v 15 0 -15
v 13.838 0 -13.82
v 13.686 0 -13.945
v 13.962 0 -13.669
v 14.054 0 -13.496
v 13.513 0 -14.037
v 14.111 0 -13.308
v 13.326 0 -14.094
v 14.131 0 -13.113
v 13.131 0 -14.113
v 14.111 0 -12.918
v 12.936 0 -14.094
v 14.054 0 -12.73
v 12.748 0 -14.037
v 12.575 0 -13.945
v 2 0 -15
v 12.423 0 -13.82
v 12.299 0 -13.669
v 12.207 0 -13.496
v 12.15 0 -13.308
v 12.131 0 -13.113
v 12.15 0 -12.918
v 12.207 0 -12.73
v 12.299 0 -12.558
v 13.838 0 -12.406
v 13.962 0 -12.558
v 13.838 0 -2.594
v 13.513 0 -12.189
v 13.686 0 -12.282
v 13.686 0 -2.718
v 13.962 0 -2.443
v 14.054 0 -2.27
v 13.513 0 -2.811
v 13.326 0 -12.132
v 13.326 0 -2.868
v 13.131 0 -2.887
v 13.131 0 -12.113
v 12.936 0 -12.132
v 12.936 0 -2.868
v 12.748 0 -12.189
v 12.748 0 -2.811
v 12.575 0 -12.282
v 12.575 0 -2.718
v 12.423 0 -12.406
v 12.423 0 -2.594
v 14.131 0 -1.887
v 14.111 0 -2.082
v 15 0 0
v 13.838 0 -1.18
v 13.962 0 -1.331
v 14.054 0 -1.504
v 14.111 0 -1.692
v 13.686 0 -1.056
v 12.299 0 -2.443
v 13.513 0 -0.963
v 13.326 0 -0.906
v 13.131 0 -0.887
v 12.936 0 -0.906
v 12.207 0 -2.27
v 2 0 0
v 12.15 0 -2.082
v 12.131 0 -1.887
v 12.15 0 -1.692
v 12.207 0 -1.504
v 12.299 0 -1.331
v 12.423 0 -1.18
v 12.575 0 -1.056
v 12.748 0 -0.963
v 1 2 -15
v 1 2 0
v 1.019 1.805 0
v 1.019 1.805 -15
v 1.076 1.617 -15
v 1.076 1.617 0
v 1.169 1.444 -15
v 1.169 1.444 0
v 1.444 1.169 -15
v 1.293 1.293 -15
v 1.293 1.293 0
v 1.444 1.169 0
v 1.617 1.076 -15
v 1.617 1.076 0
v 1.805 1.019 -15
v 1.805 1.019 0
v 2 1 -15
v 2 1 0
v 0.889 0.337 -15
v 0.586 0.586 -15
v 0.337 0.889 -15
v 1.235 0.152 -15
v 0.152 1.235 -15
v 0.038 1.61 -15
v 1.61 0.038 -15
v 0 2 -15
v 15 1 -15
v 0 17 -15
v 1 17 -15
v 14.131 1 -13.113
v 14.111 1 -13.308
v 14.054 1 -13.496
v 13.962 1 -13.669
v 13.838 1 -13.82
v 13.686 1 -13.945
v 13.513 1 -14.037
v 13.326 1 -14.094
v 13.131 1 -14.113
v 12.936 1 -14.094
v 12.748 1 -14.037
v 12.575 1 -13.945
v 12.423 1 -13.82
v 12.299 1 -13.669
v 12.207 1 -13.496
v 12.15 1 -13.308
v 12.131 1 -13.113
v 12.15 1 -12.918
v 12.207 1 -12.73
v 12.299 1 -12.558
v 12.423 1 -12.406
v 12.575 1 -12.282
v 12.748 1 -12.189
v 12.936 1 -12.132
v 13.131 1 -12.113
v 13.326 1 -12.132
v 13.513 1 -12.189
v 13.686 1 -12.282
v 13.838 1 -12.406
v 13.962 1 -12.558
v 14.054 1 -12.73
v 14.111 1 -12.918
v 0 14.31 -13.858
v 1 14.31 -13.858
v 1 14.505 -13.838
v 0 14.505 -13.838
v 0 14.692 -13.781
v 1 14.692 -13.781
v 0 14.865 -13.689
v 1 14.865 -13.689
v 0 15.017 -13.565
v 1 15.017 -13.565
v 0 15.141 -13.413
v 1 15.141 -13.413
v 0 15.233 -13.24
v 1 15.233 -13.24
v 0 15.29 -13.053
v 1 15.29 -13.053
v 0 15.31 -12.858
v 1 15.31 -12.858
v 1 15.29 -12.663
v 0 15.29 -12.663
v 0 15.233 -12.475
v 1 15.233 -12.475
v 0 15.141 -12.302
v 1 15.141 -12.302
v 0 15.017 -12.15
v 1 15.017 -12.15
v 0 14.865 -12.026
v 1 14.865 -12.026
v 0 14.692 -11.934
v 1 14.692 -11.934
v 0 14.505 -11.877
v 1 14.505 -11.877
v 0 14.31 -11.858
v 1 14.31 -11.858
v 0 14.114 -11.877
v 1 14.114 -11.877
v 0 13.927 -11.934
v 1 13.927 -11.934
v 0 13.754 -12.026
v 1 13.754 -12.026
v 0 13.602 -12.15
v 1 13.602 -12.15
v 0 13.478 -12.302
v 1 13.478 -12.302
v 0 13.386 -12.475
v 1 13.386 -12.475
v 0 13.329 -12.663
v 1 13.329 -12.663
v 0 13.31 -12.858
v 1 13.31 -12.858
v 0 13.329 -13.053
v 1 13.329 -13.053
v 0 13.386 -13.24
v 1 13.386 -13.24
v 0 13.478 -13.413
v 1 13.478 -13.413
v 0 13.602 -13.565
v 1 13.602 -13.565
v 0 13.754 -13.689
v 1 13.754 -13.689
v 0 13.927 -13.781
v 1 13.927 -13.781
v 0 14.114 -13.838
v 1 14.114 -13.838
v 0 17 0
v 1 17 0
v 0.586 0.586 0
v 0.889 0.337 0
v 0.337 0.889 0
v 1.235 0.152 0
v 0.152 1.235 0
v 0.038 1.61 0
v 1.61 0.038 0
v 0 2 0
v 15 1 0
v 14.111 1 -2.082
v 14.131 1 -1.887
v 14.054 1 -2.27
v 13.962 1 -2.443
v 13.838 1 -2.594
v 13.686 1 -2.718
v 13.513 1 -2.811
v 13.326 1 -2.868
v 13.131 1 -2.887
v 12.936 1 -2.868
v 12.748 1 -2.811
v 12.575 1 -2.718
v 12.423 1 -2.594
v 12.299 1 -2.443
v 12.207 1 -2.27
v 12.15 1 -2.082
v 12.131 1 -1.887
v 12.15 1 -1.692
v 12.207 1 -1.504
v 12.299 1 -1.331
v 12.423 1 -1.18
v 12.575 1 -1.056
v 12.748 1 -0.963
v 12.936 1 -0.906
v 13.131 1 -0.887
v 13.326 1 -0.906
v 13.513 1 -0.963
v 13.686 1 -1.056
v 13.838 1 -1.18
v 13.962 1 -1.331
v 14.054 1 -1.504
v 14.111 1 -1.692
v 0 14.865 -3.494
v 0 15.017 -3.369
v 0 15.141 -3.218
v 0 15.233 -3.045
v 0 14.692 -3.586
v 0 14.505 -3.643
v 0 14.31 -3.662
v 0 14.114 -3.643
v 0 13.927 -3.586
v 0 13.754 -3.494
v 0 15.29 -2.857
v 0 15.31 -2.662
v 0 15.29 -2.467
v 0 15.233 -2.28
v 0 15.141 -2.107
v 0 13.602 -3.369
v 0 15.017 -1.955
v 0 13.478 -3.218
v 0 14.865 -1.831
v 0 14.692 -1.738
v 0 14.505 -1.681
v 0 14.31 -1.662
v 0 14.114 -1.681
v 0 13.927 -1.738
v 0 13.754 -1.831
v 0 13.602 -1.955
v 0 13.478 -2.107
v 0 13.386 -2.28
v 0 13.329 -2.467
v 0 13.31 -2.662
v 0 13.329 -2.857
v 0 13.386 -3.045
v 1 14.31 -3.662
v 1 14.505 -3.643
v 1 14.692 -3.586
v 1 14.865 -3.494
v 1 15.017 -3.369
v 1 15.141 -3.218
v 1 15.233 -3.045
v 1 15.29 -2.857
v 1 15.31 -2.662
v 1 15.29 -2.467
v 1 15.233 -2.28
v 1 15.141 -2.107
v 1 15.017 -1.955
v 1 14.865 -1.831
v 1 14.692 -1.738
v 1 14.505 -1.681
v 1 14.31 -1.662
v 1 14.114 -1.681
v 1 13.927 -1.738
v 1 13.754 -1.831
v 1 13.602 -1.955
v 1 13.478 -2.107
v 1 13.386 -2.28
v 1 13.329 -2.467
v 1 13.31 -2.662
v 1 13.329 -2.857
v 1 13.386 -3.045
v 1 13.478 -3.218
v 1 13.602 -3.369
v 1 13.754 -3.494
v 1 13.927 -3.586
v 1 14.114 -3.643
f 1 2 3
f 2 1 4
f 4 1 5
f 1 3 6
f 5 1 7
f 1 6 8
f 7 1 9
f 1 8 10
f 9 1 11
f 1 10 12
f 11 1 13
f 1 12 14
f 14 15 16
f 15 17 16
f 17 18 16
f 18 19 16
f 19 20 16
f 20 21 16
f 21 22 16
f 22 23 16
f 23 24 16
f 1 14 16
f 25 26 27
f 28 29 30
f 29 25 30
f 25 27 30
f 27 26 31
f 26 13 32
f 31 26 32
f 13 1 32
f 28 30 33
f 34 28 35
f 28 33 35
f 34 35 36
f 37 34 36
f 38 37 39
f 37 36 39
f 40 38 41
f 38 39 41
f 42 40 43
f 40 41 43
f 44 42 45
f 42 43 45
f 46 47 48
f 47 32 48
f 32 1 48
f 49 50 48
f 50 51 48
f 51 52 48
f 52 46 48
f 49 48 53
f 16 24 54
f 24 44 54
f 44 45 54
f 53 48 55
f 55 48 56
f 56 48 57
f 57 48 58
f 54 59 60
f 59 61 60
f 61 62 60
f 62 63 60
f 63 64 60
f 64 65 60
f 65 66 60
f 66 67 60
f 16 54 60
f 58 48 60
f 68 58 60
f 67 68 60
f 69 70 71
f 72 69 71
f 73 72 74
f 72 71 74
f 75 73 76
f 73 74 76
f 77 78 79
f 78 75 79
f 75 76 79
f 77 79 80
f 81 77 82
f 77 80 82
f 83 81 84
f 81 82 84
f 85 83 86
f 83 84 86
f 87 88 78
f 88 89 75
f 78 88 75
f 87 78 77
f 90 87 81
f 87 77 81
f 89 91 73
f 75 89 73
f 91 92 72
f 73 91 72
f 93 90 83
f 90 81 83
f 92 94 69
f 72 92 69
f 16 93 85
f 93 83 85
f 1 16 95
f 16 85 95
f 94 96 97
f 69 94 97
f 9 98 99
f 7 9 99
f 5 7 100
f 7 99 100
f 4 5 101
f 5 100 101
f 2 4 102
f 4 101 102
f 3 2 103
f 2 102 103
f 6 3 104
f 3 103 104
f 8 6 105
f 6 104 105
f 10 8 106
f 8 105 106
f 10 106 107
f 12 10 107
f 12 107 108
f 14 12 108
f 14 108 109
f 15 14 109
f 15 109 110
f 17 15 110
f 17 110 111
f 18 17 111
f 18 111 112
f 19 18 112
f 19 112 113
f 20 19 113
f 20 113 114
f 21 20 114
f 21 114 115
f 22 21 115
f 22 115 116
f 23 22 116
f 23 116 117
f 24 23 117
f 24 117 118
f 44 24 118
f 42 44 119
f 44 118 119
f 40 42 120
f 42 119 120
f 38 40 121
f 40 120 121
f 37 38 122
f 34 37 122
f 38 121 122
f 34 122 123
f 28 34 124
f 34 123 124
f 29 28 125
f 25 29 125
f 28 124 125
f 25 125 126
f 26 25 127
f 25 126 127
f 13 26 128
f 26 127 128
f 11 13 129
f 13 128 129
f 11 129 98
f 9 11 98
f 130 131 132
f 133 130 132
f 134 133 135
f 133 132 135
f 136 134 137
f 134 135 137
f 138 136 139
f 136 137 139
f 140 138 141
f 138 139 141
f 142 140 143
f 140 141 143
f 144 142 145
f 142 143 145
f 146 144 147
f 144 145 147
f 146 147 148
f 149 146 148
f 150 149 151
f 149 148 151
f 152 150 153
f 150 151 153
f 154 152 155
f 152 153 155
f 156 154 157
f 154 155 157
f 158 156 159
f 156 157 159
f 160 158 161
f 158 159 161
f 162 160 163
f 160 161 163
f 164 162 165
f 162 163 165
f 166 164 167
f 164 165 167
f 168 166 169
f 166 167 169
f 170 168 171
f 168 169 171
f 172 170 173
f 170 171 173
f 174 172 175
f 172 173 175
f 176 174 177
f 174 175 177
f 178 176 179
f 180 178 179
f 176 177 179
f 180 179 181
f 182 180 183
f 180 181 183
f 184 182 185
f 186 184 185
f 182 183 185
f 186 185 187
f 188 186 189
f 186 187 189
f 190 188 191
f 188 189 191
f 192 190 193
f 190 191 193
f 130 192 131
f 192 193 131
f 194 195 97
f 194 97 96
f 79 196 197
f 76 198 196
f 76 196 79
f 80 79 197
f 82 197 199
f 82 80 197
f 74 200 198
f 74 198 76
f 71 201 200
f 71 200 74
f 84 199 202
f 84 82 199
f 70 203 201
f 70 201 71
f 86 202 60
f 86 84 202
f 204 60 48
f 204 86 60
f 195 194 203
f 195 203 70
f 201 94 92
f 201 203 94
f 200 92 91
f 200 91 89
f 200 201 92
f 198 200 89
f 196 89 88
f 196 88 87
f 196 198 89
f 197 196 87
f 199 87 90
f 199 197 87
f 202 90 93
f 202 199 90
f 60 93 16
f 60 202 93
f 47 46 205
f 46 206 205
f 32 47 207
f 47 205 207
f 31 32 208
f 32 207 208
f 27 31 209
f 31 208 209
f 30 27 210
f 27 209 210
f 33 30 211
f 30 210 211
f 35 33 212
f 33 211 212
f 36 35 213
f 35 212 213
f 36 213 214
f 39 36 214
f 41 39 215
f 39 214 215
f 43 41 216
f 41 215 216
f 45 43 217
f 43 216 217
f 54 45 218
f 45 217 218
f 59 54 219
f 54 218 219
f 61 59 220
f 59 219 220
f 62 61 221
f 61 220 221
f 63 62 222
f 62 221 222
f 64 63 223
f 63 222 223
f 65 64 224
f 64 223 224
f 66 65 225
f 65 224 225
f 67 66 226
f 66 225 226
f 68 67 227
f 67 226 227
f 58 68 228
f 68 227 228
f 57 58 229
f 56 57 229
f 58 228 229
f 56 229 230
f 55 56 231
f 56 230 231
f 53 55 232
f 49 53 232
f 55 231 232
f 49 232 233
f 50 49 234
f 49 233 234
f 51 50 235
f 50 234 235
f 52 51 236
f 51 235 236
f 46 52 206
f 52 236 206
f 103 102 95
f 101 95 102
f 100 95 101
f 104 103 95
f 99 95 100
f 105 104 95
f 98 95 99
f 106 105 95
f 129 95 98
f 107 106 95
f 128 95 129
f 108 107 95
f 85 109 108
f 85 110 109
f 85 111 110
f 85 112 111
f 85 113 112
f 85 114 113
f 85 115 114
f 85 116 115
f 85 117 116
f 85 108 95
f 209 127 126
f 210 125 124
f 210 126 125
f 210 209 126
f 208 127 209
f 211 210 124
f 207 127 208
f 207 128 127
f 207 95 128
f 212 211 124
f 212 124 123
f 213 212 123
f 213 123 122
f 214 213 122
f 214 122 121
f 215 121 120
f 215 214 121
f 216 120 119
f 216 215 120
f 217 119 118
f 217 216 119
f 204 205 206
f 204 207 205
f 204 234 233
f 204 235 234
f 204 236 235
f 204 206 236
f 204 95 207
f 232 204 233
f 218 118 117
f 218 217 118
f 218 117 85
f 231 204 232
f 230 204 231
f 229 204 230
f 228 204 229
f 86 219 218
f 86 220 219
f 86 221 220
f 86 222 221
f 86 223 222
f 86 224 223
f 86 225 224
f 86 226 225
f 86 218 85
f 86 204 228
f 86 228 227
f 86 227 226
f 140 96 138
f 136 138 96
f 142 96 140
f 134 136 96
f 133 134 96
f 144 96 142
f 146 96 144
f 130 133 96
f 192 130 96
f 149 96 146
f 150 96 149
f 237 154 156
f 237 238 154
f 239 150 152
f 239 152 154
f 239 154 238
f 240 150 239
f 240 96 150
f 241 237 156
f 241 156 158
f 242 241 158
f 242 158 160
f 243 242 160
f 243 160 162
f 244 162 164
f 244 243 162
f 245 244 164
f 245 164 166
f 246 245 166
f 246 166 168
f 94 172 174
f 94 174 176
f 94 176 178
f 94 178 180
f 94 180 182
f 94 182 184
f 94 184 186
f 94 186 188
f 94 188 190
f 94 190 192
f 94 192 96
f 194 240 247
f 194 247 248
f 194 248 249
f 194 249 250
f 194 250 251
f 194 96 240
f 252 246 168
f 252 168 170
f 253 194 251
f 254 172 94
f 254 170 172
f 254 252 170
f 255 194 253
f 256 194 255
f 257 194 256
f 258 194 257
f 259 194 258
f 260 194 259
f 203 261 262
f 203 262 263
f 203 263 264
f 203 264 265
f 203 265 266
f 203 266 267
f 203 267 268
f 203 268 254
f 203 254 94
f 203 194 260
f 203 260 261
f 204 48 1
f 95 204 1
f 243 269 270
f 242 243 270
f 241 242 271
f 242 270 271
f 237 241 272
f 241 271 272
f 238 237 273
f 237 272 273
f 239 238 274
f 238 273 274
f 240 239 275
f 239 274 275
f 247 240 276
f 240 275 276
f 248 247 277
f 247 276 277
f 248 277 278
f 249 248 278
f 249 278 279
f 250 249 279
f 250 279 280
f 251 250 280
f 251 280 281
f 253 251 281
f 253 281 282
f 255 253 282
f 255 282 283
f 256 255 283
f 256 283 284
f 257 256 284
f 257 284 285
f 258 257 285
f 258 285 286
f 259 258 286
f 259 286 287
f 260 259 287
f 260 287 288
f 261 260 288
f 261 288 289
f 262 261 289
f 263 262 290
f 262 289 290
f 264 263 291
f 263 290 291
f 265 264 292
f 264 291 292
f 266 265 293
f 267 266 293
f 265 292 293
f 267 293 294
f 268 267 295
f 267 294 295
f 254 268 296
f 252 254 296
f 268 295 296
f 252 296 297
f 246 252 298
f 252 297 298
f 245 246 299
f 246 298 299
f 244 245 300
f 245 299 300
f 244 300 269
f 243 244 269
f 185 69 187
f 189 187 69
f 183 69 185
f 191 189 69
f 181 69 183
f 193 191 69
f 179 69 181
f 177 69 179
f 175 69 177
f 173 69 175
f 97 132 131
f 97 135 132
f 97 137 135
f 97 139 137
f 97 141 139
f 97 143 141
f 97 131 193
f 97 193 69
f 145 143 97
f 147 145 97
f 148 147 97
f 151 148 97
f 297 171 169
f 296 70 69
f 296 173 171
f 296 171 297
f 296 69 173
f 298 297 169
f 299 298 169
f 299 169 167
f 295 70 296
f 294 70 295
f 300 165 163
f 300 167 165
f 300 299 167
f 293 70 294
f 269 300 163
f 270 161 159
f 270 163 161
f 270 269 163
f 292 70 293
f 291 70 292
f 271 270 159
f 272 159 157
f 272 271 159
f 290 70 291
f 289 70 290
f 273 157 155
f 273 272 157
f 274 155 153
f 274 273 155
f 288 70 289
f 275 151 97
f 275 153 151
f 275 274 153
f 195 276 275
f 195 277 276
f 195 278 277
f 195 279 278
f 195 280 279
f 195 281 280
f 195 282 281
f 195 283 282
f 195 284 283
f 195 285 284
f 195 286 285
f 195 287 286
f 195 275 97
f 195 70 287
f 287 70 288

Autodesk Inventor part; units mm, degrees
ref_plane "YZ Plane" through (0, 0, 0) normal (1, 0, 0) x (0, 1, 0)
ref_plane "XZ Plane" through (0, 0, 0) normal (0, 1, 0) x (-1, 0, 0)
ref_plane "XY Plane" through (0, 0, 0) normal (0, 0, 1) x (1, 0, 0)
sketch "Sketch1" plane through (0, 0, 0) normal (0, 1, 0) x (-1, 0, 0)
  line L0 (0, 0) -> (-15, 0)
  line L1 (-15, 0) -> (-15, -15)
  line L2 (-15, -15) -> (0, -15)
  line L3 (0, -15) -> (0, 0)
extrude "Plate1" add sketch "Sketch1" along normal blind 1
sketch "Sketch2" plane through (1, 0, 0) normal (-1, 0, 0) x (0, -1, 0)
  line L0 (0, -15) -> (0, 0)
  line L1 (0, 0) -> (-17, 0)
  line L2 (-17, 0) -> (-17, -15)
  line L3 (-17, -15) -> (0, -15)
edge flange "Flange1" height 17 angle 90 thickness 1 bend radius 1 thickness toward (-1, 0, 0) relief tear relief width 1 relief depth 0.5 edges at (0, 1, -7.5) wall of the first edge with corners at (1, 0, -15) (1, 0, 0) (1, 17, 0) (1, 17, -15)
bend "Bend1"
corner "Corner1"
sketch "Sketch3" plane through (0, 1, 0) normal (0, 1, 0) x (1, 0, 0)
  circle A0 centre (13.1306, 13.1131) radius 1
  line L0 (2, 15) -> (15, 15) projected
  circle A1 centre (13.1306, 1.887) radius 1
  point P0 (0, 0)
extrude "Extrusion1" cut sketch "Sketch3" against normal through all
sketch "Sketch4" plane through (1, 17, 0) normal (1, 0, 0) x (0, 0, -1)
  circle A0 centre (2.6622, -2.6905) radius 1
  circle A1 centre (12.8576, -2.6905) radius 1
  point P0 (0, -17)
extrude "Extrusion2" cut sketch "Sketch4" against normal blind 10
equation "\"d2\" = Thickness"
equation "\"d3\" = BendReliefWidth"
equation "\"d4\" = BendReliefDepth"
equation "\"d5\" = MinimumRemnant"
equation "\"d6\" = TransitionRadius"
equation "\"d9\" = BendRadius"
equation "\"d10\" = CornerReliefSize"
equation "\"d11\" = GapSize"
equation "\"d12\" = JacobiRadiusSize"
equation "\"BendRadius\" = Thickness"
equation "\"BendReliefWidth\" = Thickness"
equation "\"BendReliefDepth\" = 0.5 * Thickness"
equation "\"CornerReliefSize\" = 4 * Thickness"
equation "\"MinimumRemnant\" = 2 * Thickness"
equation "\"TransitionRadius\" = BendRadius"
equation "\"JacobiRadiusSize\" = BendRadius"
equation "\"GapSize\" = Thickness"
equation "\"Thickness\" = 1"
properties part number "Clamps"
